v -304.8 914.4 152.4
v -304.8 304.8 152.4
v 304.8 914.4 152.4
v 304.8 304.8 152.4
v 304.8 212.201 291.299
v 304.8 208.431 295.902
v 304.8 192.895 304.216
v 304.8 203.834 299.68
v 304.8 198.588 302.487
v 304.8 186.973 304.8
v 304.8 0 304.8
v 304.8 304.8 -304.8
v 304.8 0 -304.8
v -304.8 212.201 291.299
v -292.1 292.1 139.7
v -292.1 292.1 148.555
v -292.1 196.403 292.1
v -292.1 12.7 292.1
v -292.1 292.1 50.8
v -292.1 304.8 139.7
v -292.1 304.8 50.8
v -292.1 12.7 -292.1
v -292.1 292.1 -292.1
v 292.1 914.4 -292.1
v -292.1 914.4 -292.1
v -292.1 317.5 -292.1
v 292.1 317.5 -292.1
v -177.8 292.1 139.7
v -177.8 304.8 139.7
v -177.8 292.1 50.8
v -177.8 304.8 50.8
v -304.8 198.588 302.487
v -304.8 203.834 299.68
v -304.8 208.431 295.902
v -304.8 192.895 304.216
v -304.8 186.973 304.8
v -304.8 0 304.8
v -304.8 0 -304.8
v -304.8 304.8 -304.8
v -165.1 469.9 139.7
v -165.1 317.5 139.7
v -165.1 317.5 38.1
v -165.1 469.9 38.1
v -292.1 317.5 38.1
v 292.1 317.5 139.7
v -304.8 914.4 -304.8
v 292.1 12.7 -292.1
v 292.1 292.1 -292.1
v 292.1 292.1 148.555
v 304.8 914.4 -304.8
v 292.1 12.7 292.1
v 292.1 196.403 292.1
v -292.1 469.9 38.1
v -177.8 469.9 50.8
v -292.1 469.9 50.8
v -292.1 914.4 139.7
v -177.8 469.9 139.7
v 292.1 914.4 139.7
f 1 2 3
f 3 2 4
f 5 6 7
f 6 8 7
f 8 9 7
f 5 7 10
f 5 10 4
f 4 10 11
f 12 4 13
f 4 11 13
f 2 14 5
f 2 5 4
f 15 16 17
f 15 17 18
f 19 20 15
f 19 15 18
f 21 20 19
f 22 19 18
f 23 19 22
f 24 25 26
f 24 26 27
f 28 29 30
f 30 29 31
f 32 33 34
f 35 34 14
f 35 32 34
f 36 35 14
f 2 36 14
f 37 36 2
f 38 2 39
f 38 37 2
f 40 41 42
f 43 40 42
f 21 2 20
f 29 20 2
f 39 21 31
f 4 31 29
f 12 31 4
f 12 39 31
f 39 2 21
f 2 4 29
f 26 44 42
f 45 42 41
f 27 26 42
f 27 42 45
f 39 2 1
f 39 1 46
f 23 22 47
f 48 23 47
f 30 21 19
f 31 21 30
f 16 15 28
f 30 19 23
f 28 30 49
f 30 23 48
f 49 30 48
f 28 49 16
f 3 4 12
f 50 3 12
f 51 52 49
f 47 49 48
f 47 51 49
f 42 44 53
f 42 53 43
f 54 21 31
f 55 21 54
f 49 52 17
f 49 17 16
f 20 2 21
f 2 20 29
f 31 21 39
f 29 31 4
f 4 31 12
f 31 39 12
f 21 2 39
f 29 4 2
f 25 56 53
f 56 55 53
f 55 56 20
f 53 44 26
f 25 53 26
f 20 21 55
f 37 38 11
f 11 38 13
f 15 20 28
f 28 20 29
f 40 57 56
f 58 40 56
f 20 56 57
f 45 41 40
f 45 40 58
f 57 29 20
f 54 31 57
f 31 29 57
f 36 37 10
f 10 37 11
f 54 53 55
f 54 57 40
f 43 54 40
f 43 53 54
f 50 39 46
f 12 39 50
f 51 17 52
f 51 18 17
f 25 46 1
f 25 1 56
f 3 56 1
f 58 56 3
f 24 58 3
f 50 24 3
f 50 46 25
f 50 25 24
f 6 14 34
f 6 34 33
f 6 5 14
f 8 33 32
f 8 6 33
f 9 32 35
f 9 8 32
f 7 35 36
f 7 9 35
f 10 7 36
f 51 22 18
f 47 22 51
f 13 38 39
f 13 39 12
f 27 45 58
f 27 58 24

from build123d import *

# Parameters (mm, degrees)
SKETCH1_W               = 609.6
SKETCH1_H               = 609.6
BOSS_EXTRUDE1_DEPTH     = 304.8
CUT_EXTRUDE2_DEPTH      = 747.6044736
CUT_EXTRUDE2_DEPTH_BACK = 609.6
SHELL11_T               = 12.7
SKETCH13_W              = 609.6
SKETCH13_H              = 457.2
BOSS_EXTRUDE7_DEPTH     = 609.6
SHELL13_T               = -12.7
SKETCH14_W              = 127
SKETCH14_H              = 101.6
BOSS_EXTRUDE8_DEPTH     = 152.4
SHELL14_START           = -292.1
SHELL14_OUTLINE_W       = 152.4
SHELL14_OUTLINE_H       = 88.9
SHELL14_DEPTH           = 114.3
SKETCH17_W              = 114.3
SKETCH17_H              = 88.9
CUT_EXTRUDE3_DEPTH      = 237.744
FILLET2_R               = 30.32


# Read off the part's stored shape, not the designer's step: Shell14
with BuildPart() as part:
    # Sketch1 → Boss-Extrude1 (new body)
    with BuildSketch(Plane(origin=(0, 0, 0), x_dir=(1, 0, 0), z_dir=(0, 1, 0))):
        Rectangle(SKETCH1_W, SKETCH1_H)
    extrude(amount=BOSS_EXTRUDE1_DEPTH)

    # Sketch11 → Cut-Extrude2 (cut, two sides: drawn at the far end of the back side and taken through both)
    with BuildSketch(Plane(origin=(304.8, 0, 0), x_dir=(0, 0, -1), z_dir=(1, 0, 0)).offset(-CUT_EXTRUDE2_DEPTH_BACK)):
        Polygon((-1382.429640083, -515.219760055), (-304.8, 203.2), (-152.4, 304.8), (925.229640083, 1023.219760055), (-511.609880028, 3178.47904022), (-2819.269160193, 1640.03952011), align=None)
    extrude(amount=CUT_EXTRUDE2_DEPTH + CUT_EXTRUDE2_DEPTH_BACK, mode=Mode.SUBTRACT)

    # Shell11 (no face opened: a closed hollow body)
    add(offset(amount=-SHELL11_T, mode=Mode.PRIVATE), mode=Mode.SUBTRACT)


with BuildPart() as body_2:
    # Sketch13 → Boss-Extrude7 (new body)
    with BuildSketch(Plane(origin=(0, 304.8, 0), x_dir=(1, 0, 0), z_dir=(0, 1, 0))):
        with Locations((0, 76.2)):
            Rectangle(SKETCH13_W, SKETCH13_H)
    extrude(amount=BOSS_EXTRUDE7_DEPTH)

    # Shell13
    shell13_openings = [body_2.faces().sort_by_distance(p)[0] for p in [
        (0, 914.4, -76.2),
    ]]
    offset(amount=SHELL13_T, openings=shell13_openings, kind=Kind.INTERSECTION)

    # Sketch14 → Boss-Extrude8 (add)
    with BuildSketch(Plane(origin=(0, 317.5, 0), x_dir=(1, 0, 0), z_dir=(0, 1, 0))):
        with Locations((-228.6, -88.9)):
            Rectangle(SKETCH14_W, SKETCH14_H)
    extrude(amount=BOSS_EXTRUDE8_DEPTH)

    # Shell14 outline → Shell14 (cut)
    with BuildSketch(Plane.YZ.offset(SHELL14_START)):
        with Locations((393.7, 95.25)):
            Rectangle(SHELL14_OUTLINE_W, SHELL14_OUTLINE_H)
    extrude(amount=SHELL14_DEPTH, mode=Mode.SUBTRACT)


with BuildPart() as cut_extrude3_tool:
    # Sketch17 → Cut-Extrude3 (new body)
    with BuildSketch(Plane(origin=(0, 317.5, 0), x_dir=(1, 0, 0), z_dir=(0, 1, 0))):
        with Locations((-234.95, -95.25)):
            Rectangle(SKETCH17_W, SKETCH17_H)
    extrude(amount=-CUT_EXTRUDE3_DEPTH)


with BuildPart() as part_1:
    add(part.part)

    # Cut-Extrude3: cut by cut_extrude3_tool
    add(cut_extrude3_tool.part, mode=Mode.SUBTRACT)

    # Fillet2
    fillet2_edges = [part_1.edges().sort_by_distance(p)[0] for p in [
        (0, 203.2, 304.8),
    ]]
    fillet(fillet2_edges, radius=FILLET2_R)


with BuildPart() as body_2_1:
    add(body_2.part)

    # Cut-Extrude3: cut by cut_extrude3_tool
    add(cut_extrude3_tool.part, mode=Mode.SUBTRACT)


solid = Compound([part_1.part, body_2_1.part])
